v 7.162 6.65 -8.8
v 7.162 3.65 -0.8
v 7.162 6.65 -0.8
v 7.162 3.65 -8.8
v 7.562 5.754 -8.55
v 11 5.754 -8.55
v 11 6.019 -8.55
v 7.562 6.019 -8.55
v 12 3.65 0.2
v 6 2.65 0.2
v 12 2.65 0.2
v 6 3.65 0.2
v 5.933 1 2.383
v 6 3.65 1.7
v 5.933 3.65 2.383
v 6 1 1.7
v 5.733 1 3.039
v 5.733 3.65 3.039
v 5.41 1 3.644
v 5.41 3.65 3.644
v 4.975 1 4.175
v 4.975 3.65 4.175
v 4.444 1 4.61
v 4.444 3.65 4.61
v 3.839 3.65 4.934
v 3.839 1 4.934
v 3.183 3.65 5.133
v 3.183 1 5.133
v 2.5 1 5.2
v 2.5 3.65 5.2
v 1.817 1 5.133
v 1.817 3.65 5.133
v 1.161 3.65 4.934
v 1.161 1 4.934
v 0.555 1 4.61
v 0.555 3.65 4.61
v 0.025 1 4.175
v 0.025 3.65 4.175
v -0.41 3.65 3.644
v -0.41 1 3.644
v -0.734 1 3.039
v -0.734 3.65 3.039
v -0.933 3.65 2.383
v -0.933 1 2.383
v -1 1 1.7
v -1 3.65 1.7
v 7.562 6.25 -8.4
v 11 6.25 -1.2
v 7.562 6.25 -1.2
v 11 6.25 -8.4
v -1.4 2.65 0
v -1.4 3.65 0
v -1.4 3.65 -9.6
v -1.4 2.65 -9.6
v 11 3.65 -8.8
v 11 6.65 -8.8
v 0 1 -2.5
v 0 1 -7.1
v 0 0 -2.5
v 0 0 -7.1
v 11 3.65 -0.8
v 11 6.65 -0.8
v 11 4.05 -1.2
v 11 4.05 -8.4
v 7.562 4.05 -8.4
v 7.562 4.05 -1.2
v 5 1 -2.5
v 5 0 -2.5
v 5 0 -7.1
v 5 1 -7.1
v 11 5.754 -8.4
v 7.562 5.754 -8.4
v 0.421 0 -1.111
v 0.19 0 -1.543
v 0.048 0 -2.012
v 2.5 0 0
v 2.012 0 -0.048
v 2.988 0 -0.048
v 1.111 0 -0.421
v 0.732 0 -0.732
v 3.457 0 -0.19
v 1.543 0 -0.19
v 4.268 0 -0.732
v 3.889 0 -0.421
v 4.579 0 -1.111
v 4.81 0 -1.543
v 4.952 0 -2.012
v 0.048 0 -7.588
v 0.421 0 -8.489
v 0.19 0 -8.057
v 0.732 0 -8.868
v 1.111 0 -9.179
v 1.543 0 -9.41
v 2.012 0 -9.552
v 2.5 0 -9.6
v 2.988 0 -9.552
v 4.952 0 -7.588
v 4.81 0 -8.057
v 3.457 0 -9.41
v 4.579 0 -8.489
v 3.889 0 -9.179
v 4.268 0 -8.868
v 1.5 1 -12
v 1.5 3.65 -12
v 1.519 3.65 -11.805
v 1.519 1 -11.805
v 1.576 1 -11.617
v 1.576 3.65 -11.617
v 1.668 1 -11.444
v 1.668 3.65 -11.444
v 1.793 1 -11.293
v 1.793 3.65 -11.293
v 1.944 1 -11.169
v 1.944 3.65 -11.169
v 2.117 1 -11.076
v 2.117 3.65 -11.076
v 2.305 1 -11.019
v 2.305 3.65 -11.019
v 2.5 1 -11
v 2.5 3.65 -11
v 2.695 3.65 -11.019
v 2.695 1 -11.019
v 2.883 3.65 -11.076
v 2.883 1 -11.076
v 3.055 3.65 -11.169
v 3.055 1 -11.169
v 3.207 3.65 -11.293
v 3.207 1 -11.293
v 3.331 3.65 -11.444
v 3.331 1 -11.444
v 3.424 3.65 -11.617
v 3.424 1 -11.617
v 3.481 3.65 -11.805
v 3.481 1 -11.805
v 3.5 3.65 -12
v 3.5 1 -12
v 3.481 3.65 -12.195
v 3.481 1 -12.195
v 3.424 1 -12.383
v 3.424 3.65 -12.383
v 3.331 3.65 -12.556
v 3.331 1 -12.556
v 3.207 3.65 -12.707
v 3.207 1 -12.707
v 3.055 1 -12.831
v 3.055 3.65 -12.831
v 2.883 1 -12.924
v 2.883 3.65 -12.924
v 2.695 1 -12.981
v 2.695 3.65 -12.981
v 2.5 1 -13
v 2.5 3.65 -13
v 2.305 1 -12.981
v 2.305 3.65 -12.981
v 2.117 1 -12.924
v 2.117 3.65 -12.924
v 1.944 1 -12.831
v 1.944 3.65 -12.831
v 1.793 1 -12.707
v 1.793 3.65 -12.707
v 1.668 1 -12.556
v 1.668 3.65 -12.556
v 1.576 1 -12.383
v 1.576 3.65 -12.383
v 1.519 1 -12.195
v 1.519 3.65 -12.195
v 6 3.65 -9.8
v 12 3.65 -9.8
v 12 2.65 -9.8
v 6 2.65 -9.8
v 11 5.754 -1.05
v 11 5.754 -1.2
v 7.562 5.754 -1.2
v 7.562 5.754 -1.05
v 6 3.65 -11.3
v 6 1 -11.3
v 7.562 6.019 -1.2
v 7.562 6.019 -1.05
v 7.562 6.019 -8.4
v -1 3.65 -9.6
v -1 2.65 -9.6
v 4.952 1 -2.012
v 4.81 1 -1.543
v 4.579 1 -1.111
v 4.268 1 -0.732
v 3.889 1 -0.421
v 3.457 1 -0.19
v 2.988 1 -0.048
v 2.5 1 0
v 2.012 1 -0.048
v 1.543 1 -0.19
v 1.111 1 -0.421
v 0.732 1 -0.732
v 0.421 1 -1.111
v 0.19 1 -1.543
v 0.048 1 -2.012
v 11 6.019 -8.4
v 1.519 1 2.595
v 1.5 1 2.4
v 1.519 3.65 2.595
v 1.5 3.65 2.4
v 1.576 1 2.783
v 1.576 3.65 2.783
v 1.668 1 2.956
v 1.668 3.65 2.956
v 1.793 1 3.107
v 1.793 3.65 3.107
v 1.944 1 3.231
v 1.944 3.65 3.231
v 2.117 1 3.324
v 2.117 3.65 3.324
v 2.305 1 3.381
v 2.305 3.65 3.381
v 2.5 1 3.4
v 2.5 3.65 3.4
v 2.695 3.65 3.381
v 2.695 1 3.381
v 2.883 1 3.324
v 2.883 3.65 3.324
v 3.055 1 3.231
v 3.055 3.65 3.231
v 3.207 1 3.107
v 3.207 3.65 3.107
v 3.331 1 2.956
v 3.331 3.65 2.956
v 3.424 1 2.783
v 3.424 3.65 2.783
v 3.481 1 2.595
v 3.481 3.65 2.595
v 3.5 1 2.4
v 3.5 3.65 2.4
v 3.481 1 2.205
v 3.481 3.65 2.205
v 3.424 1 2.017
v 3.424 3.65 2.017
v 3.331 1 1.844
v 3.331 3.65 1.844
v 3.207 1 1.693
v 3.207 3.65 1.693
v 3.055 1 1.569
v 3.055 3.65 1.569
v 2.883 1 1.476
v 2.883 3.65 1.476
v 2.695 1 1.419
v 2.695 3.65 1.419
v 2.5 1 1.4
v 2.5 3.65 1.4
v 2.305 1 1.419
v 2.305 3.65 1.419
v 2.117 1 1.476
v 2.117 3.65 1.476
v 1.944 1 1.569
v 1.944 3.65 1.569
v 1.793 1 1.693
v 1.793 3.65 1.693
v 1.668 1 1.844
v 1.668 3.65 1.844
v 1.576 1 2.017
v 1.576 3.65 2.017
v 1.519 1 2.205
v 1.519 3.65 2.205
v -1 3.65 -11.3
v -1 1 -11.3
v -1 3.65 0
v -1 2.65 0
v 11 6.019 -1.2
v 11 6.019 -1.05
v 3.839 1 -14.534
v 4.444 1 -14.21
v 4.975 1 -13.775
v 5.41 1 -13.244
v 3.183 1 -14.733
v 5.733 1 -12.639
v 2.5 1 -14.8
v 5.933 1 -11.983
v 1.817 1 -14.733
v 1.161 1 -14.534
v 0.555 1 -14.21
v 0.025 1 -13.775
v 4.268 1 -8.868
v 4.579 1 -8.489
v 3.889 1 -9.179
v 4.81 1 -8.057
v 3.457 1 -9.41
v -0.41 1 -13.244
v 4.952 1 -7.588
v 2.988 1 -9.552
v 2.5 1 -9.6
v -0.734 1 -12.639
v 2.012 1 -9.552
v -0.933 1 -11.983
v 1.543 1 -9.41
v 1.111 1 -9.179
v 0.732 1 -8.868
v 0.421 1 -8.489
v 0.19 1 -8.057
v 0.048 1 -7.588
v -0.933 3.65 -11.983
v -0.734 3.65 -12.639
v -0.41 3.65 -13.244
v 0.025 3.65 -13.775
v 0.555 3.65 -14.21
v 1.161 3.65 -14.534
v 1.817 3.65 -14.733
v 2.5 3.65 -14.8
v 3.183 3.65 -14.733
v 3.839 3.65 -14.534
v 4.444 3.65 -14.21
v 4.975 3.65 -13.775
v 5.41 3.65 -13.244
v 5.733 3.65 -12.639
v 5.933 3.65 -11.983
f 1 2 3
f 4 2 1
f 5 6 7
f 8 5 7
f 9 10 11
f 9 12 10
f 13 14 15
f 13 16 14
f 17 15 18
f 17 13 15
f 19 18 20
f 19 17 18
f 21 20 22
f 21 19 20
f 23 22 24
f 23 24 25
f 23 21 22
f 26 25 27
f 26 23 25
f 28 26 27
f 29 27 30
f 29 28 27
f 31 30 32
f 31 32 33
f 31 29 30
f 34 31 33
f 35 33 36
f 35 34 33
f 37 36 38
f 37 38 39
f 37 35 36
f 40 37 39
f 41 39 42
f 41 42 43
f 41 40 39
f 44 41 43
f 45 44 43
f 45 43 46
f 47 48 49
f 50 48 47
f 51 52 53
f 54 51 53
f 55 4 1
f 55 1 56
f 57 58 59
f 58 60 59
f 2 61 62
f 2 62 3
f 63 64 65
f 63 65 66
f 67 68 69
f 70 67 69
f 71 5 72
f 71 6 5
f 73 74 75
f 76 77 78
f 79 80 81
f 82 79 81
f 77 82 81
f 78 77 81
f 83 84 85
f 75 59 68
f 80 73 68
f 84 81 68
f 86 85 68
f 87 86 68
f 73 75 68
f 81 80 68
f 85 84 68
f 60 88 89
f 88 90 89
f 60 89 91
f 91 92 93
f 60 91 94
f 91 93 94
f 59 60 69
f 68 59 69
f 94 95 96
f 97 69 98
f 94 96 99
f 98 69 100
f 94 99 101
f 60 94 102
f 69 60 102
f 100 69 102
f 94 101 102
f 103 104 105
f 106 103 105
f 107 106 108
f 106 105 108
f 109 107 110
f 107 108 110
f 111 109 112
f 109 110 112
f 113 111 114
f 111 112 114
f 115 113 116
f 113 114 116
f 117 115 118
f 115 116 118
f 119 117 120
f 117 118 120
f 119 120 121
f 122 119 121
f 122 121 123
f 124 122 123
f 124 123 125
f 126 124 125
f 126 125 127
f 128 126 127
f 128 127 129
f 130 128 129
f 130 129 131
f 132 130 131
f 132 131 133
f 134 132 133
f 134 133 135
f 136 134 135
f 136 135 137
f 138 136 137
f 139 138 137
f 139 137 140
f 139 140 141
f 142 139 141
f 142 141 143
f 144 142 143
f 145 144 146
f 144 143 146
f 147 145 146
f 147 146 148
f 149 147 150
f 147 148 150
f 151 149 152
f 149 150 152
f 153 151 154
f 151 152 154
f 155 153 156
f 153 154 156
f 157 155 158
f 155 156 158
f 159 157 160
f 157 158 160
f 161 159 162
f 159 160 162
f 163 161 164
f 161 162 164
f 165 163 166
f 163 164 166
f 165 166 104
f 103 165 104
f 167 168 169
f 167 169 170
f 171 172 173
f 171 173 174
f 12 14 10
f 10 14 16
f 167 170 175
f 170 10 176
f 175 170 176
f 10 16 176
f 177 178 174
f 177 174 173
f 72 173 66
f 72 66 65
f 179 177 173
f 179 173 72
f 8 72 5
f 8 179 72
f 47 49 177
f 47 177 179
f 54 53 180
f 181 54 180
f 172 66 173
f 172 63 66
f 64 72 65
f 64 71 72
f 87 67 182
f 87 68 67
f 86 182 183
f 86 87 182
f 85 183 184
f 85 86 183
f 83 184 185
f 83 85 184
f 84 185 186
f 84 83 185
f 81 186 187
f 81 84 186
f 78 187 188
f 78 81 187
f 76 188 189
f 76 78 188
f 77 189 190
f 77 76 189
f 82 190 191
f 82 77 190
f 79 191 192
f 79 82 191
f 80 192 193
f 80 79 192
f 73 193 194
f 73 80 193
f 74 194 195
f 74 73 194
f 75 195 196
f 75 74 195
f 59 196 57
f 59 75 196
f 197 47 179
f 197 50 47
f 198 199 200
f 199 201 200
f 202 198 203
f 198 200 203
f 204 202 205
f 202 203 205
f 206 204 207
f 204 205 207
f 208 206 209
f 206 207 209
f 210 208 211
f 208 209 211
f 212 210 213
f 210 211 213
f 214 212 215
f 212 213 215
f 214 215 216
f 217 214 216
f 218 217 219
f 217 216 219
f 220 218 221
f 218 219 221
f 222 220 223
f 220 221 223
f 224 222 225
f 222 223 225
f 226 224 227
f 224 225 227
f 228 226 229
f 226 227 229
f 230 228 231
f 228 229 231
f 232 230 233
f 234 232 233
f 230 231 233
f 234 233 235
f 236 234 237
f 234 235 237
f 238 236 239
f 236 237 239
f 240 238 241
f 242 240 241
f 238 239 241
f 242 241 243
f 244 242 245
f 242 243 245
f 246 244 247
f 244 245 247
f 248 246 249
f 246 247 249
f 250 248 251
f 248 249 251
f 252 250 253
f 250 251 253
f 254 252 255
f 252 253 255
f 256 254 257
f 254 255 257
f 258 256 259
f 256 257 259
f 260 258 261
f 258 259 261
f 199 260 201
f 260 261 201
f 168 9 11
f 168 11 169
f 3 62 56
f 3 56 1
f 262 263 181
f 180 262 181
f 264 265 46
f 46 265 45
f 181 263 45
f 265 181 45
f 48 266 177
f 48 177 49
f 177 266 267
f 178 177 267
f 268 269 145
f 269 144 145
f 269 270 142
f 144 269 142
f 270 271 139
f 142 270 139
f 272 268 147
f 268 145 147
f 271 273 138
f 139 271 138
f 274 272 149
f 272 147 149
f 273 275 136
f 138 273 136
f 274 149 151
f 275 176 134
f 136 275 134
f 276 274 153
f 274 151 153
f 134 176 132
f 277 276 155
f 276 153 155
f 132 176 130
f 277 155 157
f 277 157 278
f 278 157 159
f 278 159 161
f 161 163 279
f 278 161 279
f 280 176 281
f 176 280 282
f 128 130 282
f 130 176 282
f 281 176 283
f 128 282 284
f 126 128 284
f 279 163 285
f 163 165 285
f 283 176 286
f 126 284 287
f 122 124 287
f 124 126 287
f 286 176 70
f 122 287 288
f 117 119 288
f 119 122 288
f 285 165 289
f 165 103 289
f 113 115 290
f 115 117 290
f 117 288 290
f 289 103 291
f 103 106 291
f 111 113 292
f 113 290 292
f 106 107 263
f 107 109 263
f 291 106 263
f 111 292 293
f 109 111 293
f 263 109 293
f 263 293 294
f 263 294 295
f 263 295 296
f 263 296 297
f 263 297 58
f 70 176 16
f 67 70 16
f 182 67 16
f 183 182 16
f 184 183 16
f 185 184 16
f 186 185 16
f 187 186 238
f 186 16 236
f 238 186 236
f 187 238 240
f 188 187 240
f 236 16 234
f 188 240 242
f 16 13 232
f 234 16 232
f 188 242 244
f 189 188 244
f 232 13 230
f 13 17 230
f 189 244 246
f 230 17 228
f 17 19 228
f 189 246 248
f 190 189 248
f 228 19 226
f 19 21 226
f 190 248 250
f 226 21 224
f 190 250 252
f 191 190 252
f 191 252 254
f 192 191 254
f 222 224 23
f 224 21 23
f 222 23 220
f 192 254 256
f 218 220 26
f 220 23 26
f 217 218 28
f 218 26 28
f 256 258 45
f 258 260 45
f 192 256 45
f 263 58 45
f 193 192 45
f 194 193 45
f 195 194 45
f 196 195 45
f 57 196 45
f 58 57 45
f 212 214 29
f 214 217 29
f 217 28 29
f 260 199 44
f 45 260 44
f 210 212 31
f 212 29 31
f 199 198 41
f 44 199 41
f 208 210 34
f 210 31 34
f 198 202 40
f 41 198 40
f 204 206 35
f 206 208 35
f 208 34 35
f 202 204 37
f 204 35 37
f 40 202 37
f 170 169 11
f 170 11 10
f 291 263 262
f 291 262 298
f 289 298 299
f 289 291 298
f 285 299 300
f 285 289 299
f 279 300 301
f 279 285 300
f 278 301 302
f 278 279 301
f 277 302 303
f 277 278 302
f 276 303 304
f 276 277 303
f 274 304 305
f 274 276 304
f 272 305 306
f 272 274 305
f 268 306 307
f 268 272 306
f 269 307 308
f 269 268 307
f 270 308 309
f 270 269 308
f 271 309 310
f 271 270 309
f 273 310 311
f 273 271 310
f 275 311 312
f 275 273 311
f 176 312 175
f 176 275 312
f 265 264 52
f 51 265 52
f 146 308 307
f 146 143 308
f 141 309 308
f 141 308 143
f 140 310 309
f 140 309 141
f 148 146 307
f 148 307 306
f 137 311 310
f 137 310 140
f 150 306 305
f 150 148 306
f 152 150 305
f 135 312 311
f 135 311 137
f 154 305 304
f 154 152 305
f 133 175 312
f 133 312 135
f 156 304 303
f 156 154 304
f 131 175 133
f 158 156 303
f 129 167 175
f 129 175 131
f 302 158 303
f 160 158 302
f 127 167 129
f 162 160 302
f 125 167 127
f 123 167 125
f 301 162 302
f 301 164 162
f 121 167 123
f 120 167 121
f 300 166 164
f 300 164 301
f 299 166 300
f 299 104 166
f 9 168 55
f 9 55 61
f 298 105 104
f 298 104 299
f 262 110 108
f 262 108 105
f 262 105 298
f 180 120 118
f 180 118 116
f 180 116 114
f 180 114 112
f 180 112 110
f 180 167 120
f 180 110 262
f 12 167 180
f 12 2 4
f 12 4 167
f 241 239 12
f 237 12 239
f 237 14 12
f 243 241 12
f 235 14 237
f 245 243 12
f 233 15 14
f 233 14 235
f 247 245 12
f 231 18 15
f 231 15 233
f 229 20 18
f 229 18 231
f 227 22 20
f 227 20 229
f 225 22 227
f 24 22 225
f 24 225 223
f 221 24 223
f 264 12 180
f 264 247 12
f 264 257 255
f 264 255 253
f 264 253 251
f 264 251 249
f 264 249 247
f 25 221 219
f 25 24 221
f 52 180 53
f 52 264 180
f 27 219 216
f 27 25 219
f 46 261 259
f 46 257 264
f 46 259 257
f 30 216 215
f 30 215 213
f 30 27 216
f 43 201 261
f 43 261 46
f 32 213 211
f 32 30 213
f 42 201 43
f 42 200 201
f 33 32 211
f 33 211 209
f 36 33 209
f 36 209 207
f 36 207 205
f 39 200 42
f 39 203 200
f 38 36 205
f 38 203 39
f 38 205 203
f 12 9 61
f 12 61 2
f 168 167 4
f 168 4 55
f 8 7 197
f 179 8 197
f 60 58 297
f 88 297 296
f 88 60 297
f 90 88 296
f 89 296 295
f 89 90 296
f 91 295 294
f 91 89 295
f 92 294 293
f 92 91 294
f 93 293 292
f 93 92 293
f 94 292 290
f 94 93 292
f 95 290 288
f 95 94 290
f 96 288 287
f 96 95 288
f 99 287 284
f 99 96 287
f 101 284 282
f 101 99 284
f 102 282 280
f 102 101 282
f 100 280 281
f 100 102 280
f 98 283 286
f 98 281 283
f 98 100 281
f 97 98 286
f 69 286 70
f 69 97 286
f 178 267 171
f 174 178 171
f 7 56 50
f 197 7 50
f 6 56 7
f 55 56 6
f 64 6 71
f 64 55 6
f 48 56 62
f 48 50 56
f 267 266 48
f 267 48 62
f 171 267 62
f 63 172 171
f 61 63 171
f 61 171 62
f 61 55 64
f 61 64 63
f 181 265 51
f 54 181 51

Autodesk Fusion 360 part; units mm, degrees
sketch "草图1" plane through (0, 0, 0) normal (0, 1, 0) x (1, 0, 0)
  line L0 (0, 0) -> (5, 0)
  line L1 (5, 0) -> (5, 9.6)
  line L2 (5, 9.6) -> (0, 9.6)
  line L3 (0, 9.6) -> (0, 0)
  circle A0 centre (2.5, 2.5) radius 2.5
  circle A1 centre (2.5, 7.1) radius 2.5
  dimension "d1" = 5
  dimension "d2" = 9.6
  dimension "d3" = 5
  dimension "d4" = 5
extrude "拉伸1" add sketch "草图1" along normal blind 1 contours A0 A1 | L3 A0 A1 | L1 A0 A1 | A0 A1 | A0 A1
sketch "草图2" plane through (0, 1, 0) normal (0, 1, 0) x (-1, 0, 0)
  line L0 (1.0001, 5.2) -> (-5.9999, 5.2)
  line L1 (-5.9999, 5.2) -> (-5.9999, -14.8)
  line L2 (-5.9999, -14.8) -> (1.0001, -14.8)
  line L3 (1.0001, -14.8) -> (1.0001, 5.2)
  line L4 (8, -4.8) -> (-8, -4.8)
  line L5 (0, -7.1) -> (0, -2.5)
  line L6 (-2.4999, 15.7777) -> (-2.4999, -15.7777)
  arc A0 (0, -2.5) -> (-5, -2.4998) centre (-2.5, -2.5) ccw
  line L7 (-5.9999, 5.2) -> (1.0001, -14.8)
  line L8 (1.0001, 5.2) -> (-5.9999, -14.8)
  circle A1 centre (-2.4999, -4.8) radius 1.267
  circle A2 centre (-2.4999, -4.8) radius 1.114
  circle A3 centre (-2.4999, 1.7) radius 3.5
  circle A4 centre (-2.4999, -11.3) radius 3.5
  line L9 (1.0001, 5.2) -> (1.0001, 0)
  line L10 (1.0001, 0) -> (1.4001, 0)
  line L11 (1.4001, 0) -> (1.4001, -9.6)
  line L12 (1.4001, -9.6) -> (1.0001, -9.6)
  dimension "d11" = 7
  dimension "d12" = 20
  dimension "d13" = 7
  dimension "d14" = 7
  dimension "d15" = 5.2
  dimension "d19" = 0.4
  dimension "d20" = 9.6
extrude "拉伸2" add sketch "草图2" along normal blind 2.65 contours L6 A0 L8 A3 | L6 A0 L7 A3 | A0 L8 A3 | L3 L4 L5 A0 A3 L9 | L6 A0 L8 A3 | L6 A0 L7 A3 | A0 L7 A3 | A0 L8 A3 | L4 L5 A0 L8 A1 A3 | L1 L4 L7 A1 A3 | L6 L8 A1 A3 | L6 L7 A1 A3 | A0 L7 A3 | L3 L4 L7 A1 A4 | L1 L4 L8 A1 A4 | L6 L8 A1 A2 | L6 L7 A1 A2 | L4 L8 A1 A2 | L8 A4 | L4 L7 A1 A2 | L4 L8 A1 A2 | L6 L8 A2 | L6 L7 A2 | L7 A4 | L4 L7 A1 A2 | L4 L8 A2 | L6 L8 A4 | L6 L8 A1 A4 | L4 L7 A2 | L4 L8 A2 | L6 L8 A1 A2 | L6 L7 A2 | L4 L7 A2 | L6 L8 A2 | L6 L7 A1 A4 | L6 L7 A4 | L6 L7 A1 A2
sketch "草图3" plane through (0, 3.65, 0) normal (0, 1, 0) x (-1, 0, 0)
  arc A0 (1.0001, 1.7) -> (-5.9999, 1.7) centre (-2.4999, 1.7) ccw
  line L0 (-5.9999, 1.7) -> (-5.9999, -11.3)
  arc A1 (-5.9999, -11.3) -> (1.0001, -11.3) centre (-2.4999, -11.3) ccw
  line L1 (1.0001, -11.3) -> (1.0001, 1.7)
  line L2 (3.0001, -4.8) -> (-14.9999, -4.8)
  line L3 (-5.9999, 2.4) -> (-5.9999, -12)
  line L4 (-2.4999, 10.5811) -> (-2.4999, -40.1811)
  line L5 (-5.9999, 2.4) -> (-2.4999, 2.4)
  line L6 (-5.9999, -12) -> (-2.4999, -12)
  circle A2 centre (-2.4999, 2.4) radius 1
  circle A3 centre (-2.4999, -12) radius 1
  dimension "d24" = 14.4
  dimension "d25" = 2
  dimension "d26" = 2
extrude "拉伸3" cut sketch "草图3" against normal blind 2.65 contours L4 A2 | L4 L5 A2 | L4 L5 A2 | L4 A3 | L4 L6 A3 | L4 L6 A3
sketch "草图5" plane through (0, 3.65, 0) normal (0, 1, 0) x (-1, 0, 0)
  circle A0 centre (-2.4999, 2.4) radius 1
  circle A1 centre (-2.4999, -12) radius 1
  arc A2 (1.0001, 1.7) -> (-5.9999, 1.7) centre (-2.4999, 1.7) ccw
  line L0 (-5.9999, 1.7) -> (-5.9999, -11.3)
  arc A3 (-5.9999, -11.3) -> (1.0001, -11.3) centre (-2.4999, -11.3) ccw
  line L1 (1.0001, -11.3) -> (1.0001, 1.7)
  line L2 (2.5, 5.2) -> (-8.5, 5.2)
  line L3 (1.0001, 1.7) -> (1.0001, 5.2)
  line L4 (-5.9999, 1.7) -> (-5.9999, 5.2)
  line L5 (1.0001, 5.2) -> (1.0001, 0)
  line L6 (-5.9999, 5.2) -> (-5.9999, 0.2)
  line L7 (1.0001, 0) -> (1.4001, 0)
  line L8 (1.4001, 0) -> (1.4001, -9.6)
  line L9 (1.4001, -9.6) -> (1.0001, -9.6)
  line L10 (1.0001, -9.6) -> (1.0001, 0)
  line L11 (-5.9999, 0.2) -> (-11.9999, 0.2)
  line L12 (-11.9999, 0.2) -> (-11.9999, -9.8)
  line L13 (-11.9999, -9.8) -> (-5.9999, -9.8)
  line L14 (-5.9999, -9.8) -> (-5.9999, 0.2)
  dimension "d37" = 5.2
  dimension "d38" = 5
  dimension "d39" = 0.4
  dimension "d40" = 9.6
  dimension "d41" = 6
  dimension "d42" = 10
extrude "拉伸4" add sketch "草图5" against normal blind 1 contours L1 L7 L8 L9 L10 | L0 L11 L12 L13 L14
sketch "草图6" plane through (0, 3.65, 0) normal (0, 1, 0) x (-1, 0, 0)
  circle A0 centre (-2.4999, 2.4) radius 1
  circle A1 centre (-2.4999, -12) radius 1
  arc A2 (1.0001, 1.7) -> (-5.9999, 1.7) centre (-2.4999, 1.7) ccw
  line L0 (-5.9999, 1.7) -> (-5.9999, 0.2)
  line L1 (-5.9999, 0.2) -> (-11.9999, 0.2)
  line L2 (-11.9999, 0.2) -> (-11.9999, -9.8)
  line L3 (-11.9999, -9.8) -> (-5.9999, -9.8)
  line L4 (-5.9999, -9.8) -> (-5.9999, -11.3)
  arc A3 (-5.9999, -11.3) -> (1.0001, -11.3) centre (-2.4999, -11.3) ccw
  line L5 (1.0001, -11.3) -> (1.0001, -9.6)
  line L6 (1.0001, -9.6) -> (1.4001, -9.6)
  line L7 (1.4001, -9.6) -> (1.4001, 0)
  line L8 (1.4001, 0) -> (1.0001, 0)
  line L9 (1.0001, 0) -> (1.0001, 1.7)
  line L10 (-11.9999, 0.2) -> (-10.9999, 0.2)
  line L11 (-10.9999, 0.2) -> (-10.9999, -0.8)
  line L12 (-10.9999, -0.8) -> (-11.9999, -0.8)
  line L13 (-11.9999, -0.8) -> (-11.9999, 0.2)
  line L14 (-10.9999, -0.8) -> (-7.1624, -0.8)
  line L15 (-7.1624, -0.8) -> (-7.1624, -8.8)
  line L16 (-7.1624, -8.8) -> (-10.9999, -8.8)
  line L17 (-10.9999, -8.8) -> (-10.9999, -0.8)
  dimension "d46" = 1
  dimension "d47" = 1
  dimension "d48" = 8
extrude "拉伸5" add sketch "草图6" along normal blind 3 contours L14 L15 L16 L17
sketch "草图7" plane through (10.9999, 0, 0) normal (1, 0, 0) x (0, 0, -1)
  line L0 (0.8, 3.65) -> (8.8, 3.65)
  line L1 (8.8, 3.65) -> (8.8, 6.65)
  line L2 (8.8, 6.65) -> (0.8, 6.65)
  line L3 (0.8, 6.65) -> (0.8, 3.65)
  line L4 (0.8, 6.65) -> (1.2, 6.65)
  line L5 (1.2, 6.65) -> (1.2, 6.25)
  line L6 (1.2, 6.25) -> (0.8, 6.25)
  line L7 (0.8, 6.25) -> (0.8, 6.65)
  line L8 (8.8, 3.65) -> (8.4, 3.65)
  line L9 (8.4, 3.65) -> (8.4, 4.05)
  line L10 (8.4, 4.05) -> (8.8, 4.05)
  line L11 (8.8, 4.05) -> (8.8, 3.65)
  line L12 (1.2, 6.25) -> (8.4, 6.25)
  line L13 (8.4, 6.25) -> (8.4, 4.05)
  line L14 (8.4, 4.05) -> (1.2, 4.05)
  line L15 (1.2, 4.05) -> (1.2, 6.25)
  line L16 (1.2, 6.0193) -> (8.4, 6.0193)
  line L17 (1.2, 5.7535) -> (8.4, 5.7535)
  line L18 (1.2, 5.7535) -> (1.05, 5.7535)
  line L19 (1.2, 6.0193) -> (1.05, 6.0193)
  line L20 (1.05, 6.0193) -> (1.05, 5.7535)
  line L21 (4.8, 10.0193) -> (4.8, 2.0193)
  line L22 (8.55, 5.7535) -> (8.4, 5.7535)
  line L23 (8.55, 6.0193) -> (8.4, 6.0193)
  line L24 (8.55, 5.7535) -> (8.55, 6.0193)
  point P0 (8.55, 6.0193)
  point P1 (8.55, 5.7535)
  dimension "d51" = 0.4
  dimension "d52" = 0.4
  dimension "d53" = 0.4
  dimension "d54" = 0.4
  dimension "d55" = 0.15
  dimension "d56" = 0.15
extrude "拉伸6" cut sketch "草图7" against normal blind 3.438 contours L13 L14 L17 L21 | L14 L15 L17 L21 | L13 L16 L17 L21 | L13 L22 L23 L24 | L15 L16 L17 L21 | L12 L13 L16 L21 | L12 L15 L16 L21 | L15 L18 L19 L20
